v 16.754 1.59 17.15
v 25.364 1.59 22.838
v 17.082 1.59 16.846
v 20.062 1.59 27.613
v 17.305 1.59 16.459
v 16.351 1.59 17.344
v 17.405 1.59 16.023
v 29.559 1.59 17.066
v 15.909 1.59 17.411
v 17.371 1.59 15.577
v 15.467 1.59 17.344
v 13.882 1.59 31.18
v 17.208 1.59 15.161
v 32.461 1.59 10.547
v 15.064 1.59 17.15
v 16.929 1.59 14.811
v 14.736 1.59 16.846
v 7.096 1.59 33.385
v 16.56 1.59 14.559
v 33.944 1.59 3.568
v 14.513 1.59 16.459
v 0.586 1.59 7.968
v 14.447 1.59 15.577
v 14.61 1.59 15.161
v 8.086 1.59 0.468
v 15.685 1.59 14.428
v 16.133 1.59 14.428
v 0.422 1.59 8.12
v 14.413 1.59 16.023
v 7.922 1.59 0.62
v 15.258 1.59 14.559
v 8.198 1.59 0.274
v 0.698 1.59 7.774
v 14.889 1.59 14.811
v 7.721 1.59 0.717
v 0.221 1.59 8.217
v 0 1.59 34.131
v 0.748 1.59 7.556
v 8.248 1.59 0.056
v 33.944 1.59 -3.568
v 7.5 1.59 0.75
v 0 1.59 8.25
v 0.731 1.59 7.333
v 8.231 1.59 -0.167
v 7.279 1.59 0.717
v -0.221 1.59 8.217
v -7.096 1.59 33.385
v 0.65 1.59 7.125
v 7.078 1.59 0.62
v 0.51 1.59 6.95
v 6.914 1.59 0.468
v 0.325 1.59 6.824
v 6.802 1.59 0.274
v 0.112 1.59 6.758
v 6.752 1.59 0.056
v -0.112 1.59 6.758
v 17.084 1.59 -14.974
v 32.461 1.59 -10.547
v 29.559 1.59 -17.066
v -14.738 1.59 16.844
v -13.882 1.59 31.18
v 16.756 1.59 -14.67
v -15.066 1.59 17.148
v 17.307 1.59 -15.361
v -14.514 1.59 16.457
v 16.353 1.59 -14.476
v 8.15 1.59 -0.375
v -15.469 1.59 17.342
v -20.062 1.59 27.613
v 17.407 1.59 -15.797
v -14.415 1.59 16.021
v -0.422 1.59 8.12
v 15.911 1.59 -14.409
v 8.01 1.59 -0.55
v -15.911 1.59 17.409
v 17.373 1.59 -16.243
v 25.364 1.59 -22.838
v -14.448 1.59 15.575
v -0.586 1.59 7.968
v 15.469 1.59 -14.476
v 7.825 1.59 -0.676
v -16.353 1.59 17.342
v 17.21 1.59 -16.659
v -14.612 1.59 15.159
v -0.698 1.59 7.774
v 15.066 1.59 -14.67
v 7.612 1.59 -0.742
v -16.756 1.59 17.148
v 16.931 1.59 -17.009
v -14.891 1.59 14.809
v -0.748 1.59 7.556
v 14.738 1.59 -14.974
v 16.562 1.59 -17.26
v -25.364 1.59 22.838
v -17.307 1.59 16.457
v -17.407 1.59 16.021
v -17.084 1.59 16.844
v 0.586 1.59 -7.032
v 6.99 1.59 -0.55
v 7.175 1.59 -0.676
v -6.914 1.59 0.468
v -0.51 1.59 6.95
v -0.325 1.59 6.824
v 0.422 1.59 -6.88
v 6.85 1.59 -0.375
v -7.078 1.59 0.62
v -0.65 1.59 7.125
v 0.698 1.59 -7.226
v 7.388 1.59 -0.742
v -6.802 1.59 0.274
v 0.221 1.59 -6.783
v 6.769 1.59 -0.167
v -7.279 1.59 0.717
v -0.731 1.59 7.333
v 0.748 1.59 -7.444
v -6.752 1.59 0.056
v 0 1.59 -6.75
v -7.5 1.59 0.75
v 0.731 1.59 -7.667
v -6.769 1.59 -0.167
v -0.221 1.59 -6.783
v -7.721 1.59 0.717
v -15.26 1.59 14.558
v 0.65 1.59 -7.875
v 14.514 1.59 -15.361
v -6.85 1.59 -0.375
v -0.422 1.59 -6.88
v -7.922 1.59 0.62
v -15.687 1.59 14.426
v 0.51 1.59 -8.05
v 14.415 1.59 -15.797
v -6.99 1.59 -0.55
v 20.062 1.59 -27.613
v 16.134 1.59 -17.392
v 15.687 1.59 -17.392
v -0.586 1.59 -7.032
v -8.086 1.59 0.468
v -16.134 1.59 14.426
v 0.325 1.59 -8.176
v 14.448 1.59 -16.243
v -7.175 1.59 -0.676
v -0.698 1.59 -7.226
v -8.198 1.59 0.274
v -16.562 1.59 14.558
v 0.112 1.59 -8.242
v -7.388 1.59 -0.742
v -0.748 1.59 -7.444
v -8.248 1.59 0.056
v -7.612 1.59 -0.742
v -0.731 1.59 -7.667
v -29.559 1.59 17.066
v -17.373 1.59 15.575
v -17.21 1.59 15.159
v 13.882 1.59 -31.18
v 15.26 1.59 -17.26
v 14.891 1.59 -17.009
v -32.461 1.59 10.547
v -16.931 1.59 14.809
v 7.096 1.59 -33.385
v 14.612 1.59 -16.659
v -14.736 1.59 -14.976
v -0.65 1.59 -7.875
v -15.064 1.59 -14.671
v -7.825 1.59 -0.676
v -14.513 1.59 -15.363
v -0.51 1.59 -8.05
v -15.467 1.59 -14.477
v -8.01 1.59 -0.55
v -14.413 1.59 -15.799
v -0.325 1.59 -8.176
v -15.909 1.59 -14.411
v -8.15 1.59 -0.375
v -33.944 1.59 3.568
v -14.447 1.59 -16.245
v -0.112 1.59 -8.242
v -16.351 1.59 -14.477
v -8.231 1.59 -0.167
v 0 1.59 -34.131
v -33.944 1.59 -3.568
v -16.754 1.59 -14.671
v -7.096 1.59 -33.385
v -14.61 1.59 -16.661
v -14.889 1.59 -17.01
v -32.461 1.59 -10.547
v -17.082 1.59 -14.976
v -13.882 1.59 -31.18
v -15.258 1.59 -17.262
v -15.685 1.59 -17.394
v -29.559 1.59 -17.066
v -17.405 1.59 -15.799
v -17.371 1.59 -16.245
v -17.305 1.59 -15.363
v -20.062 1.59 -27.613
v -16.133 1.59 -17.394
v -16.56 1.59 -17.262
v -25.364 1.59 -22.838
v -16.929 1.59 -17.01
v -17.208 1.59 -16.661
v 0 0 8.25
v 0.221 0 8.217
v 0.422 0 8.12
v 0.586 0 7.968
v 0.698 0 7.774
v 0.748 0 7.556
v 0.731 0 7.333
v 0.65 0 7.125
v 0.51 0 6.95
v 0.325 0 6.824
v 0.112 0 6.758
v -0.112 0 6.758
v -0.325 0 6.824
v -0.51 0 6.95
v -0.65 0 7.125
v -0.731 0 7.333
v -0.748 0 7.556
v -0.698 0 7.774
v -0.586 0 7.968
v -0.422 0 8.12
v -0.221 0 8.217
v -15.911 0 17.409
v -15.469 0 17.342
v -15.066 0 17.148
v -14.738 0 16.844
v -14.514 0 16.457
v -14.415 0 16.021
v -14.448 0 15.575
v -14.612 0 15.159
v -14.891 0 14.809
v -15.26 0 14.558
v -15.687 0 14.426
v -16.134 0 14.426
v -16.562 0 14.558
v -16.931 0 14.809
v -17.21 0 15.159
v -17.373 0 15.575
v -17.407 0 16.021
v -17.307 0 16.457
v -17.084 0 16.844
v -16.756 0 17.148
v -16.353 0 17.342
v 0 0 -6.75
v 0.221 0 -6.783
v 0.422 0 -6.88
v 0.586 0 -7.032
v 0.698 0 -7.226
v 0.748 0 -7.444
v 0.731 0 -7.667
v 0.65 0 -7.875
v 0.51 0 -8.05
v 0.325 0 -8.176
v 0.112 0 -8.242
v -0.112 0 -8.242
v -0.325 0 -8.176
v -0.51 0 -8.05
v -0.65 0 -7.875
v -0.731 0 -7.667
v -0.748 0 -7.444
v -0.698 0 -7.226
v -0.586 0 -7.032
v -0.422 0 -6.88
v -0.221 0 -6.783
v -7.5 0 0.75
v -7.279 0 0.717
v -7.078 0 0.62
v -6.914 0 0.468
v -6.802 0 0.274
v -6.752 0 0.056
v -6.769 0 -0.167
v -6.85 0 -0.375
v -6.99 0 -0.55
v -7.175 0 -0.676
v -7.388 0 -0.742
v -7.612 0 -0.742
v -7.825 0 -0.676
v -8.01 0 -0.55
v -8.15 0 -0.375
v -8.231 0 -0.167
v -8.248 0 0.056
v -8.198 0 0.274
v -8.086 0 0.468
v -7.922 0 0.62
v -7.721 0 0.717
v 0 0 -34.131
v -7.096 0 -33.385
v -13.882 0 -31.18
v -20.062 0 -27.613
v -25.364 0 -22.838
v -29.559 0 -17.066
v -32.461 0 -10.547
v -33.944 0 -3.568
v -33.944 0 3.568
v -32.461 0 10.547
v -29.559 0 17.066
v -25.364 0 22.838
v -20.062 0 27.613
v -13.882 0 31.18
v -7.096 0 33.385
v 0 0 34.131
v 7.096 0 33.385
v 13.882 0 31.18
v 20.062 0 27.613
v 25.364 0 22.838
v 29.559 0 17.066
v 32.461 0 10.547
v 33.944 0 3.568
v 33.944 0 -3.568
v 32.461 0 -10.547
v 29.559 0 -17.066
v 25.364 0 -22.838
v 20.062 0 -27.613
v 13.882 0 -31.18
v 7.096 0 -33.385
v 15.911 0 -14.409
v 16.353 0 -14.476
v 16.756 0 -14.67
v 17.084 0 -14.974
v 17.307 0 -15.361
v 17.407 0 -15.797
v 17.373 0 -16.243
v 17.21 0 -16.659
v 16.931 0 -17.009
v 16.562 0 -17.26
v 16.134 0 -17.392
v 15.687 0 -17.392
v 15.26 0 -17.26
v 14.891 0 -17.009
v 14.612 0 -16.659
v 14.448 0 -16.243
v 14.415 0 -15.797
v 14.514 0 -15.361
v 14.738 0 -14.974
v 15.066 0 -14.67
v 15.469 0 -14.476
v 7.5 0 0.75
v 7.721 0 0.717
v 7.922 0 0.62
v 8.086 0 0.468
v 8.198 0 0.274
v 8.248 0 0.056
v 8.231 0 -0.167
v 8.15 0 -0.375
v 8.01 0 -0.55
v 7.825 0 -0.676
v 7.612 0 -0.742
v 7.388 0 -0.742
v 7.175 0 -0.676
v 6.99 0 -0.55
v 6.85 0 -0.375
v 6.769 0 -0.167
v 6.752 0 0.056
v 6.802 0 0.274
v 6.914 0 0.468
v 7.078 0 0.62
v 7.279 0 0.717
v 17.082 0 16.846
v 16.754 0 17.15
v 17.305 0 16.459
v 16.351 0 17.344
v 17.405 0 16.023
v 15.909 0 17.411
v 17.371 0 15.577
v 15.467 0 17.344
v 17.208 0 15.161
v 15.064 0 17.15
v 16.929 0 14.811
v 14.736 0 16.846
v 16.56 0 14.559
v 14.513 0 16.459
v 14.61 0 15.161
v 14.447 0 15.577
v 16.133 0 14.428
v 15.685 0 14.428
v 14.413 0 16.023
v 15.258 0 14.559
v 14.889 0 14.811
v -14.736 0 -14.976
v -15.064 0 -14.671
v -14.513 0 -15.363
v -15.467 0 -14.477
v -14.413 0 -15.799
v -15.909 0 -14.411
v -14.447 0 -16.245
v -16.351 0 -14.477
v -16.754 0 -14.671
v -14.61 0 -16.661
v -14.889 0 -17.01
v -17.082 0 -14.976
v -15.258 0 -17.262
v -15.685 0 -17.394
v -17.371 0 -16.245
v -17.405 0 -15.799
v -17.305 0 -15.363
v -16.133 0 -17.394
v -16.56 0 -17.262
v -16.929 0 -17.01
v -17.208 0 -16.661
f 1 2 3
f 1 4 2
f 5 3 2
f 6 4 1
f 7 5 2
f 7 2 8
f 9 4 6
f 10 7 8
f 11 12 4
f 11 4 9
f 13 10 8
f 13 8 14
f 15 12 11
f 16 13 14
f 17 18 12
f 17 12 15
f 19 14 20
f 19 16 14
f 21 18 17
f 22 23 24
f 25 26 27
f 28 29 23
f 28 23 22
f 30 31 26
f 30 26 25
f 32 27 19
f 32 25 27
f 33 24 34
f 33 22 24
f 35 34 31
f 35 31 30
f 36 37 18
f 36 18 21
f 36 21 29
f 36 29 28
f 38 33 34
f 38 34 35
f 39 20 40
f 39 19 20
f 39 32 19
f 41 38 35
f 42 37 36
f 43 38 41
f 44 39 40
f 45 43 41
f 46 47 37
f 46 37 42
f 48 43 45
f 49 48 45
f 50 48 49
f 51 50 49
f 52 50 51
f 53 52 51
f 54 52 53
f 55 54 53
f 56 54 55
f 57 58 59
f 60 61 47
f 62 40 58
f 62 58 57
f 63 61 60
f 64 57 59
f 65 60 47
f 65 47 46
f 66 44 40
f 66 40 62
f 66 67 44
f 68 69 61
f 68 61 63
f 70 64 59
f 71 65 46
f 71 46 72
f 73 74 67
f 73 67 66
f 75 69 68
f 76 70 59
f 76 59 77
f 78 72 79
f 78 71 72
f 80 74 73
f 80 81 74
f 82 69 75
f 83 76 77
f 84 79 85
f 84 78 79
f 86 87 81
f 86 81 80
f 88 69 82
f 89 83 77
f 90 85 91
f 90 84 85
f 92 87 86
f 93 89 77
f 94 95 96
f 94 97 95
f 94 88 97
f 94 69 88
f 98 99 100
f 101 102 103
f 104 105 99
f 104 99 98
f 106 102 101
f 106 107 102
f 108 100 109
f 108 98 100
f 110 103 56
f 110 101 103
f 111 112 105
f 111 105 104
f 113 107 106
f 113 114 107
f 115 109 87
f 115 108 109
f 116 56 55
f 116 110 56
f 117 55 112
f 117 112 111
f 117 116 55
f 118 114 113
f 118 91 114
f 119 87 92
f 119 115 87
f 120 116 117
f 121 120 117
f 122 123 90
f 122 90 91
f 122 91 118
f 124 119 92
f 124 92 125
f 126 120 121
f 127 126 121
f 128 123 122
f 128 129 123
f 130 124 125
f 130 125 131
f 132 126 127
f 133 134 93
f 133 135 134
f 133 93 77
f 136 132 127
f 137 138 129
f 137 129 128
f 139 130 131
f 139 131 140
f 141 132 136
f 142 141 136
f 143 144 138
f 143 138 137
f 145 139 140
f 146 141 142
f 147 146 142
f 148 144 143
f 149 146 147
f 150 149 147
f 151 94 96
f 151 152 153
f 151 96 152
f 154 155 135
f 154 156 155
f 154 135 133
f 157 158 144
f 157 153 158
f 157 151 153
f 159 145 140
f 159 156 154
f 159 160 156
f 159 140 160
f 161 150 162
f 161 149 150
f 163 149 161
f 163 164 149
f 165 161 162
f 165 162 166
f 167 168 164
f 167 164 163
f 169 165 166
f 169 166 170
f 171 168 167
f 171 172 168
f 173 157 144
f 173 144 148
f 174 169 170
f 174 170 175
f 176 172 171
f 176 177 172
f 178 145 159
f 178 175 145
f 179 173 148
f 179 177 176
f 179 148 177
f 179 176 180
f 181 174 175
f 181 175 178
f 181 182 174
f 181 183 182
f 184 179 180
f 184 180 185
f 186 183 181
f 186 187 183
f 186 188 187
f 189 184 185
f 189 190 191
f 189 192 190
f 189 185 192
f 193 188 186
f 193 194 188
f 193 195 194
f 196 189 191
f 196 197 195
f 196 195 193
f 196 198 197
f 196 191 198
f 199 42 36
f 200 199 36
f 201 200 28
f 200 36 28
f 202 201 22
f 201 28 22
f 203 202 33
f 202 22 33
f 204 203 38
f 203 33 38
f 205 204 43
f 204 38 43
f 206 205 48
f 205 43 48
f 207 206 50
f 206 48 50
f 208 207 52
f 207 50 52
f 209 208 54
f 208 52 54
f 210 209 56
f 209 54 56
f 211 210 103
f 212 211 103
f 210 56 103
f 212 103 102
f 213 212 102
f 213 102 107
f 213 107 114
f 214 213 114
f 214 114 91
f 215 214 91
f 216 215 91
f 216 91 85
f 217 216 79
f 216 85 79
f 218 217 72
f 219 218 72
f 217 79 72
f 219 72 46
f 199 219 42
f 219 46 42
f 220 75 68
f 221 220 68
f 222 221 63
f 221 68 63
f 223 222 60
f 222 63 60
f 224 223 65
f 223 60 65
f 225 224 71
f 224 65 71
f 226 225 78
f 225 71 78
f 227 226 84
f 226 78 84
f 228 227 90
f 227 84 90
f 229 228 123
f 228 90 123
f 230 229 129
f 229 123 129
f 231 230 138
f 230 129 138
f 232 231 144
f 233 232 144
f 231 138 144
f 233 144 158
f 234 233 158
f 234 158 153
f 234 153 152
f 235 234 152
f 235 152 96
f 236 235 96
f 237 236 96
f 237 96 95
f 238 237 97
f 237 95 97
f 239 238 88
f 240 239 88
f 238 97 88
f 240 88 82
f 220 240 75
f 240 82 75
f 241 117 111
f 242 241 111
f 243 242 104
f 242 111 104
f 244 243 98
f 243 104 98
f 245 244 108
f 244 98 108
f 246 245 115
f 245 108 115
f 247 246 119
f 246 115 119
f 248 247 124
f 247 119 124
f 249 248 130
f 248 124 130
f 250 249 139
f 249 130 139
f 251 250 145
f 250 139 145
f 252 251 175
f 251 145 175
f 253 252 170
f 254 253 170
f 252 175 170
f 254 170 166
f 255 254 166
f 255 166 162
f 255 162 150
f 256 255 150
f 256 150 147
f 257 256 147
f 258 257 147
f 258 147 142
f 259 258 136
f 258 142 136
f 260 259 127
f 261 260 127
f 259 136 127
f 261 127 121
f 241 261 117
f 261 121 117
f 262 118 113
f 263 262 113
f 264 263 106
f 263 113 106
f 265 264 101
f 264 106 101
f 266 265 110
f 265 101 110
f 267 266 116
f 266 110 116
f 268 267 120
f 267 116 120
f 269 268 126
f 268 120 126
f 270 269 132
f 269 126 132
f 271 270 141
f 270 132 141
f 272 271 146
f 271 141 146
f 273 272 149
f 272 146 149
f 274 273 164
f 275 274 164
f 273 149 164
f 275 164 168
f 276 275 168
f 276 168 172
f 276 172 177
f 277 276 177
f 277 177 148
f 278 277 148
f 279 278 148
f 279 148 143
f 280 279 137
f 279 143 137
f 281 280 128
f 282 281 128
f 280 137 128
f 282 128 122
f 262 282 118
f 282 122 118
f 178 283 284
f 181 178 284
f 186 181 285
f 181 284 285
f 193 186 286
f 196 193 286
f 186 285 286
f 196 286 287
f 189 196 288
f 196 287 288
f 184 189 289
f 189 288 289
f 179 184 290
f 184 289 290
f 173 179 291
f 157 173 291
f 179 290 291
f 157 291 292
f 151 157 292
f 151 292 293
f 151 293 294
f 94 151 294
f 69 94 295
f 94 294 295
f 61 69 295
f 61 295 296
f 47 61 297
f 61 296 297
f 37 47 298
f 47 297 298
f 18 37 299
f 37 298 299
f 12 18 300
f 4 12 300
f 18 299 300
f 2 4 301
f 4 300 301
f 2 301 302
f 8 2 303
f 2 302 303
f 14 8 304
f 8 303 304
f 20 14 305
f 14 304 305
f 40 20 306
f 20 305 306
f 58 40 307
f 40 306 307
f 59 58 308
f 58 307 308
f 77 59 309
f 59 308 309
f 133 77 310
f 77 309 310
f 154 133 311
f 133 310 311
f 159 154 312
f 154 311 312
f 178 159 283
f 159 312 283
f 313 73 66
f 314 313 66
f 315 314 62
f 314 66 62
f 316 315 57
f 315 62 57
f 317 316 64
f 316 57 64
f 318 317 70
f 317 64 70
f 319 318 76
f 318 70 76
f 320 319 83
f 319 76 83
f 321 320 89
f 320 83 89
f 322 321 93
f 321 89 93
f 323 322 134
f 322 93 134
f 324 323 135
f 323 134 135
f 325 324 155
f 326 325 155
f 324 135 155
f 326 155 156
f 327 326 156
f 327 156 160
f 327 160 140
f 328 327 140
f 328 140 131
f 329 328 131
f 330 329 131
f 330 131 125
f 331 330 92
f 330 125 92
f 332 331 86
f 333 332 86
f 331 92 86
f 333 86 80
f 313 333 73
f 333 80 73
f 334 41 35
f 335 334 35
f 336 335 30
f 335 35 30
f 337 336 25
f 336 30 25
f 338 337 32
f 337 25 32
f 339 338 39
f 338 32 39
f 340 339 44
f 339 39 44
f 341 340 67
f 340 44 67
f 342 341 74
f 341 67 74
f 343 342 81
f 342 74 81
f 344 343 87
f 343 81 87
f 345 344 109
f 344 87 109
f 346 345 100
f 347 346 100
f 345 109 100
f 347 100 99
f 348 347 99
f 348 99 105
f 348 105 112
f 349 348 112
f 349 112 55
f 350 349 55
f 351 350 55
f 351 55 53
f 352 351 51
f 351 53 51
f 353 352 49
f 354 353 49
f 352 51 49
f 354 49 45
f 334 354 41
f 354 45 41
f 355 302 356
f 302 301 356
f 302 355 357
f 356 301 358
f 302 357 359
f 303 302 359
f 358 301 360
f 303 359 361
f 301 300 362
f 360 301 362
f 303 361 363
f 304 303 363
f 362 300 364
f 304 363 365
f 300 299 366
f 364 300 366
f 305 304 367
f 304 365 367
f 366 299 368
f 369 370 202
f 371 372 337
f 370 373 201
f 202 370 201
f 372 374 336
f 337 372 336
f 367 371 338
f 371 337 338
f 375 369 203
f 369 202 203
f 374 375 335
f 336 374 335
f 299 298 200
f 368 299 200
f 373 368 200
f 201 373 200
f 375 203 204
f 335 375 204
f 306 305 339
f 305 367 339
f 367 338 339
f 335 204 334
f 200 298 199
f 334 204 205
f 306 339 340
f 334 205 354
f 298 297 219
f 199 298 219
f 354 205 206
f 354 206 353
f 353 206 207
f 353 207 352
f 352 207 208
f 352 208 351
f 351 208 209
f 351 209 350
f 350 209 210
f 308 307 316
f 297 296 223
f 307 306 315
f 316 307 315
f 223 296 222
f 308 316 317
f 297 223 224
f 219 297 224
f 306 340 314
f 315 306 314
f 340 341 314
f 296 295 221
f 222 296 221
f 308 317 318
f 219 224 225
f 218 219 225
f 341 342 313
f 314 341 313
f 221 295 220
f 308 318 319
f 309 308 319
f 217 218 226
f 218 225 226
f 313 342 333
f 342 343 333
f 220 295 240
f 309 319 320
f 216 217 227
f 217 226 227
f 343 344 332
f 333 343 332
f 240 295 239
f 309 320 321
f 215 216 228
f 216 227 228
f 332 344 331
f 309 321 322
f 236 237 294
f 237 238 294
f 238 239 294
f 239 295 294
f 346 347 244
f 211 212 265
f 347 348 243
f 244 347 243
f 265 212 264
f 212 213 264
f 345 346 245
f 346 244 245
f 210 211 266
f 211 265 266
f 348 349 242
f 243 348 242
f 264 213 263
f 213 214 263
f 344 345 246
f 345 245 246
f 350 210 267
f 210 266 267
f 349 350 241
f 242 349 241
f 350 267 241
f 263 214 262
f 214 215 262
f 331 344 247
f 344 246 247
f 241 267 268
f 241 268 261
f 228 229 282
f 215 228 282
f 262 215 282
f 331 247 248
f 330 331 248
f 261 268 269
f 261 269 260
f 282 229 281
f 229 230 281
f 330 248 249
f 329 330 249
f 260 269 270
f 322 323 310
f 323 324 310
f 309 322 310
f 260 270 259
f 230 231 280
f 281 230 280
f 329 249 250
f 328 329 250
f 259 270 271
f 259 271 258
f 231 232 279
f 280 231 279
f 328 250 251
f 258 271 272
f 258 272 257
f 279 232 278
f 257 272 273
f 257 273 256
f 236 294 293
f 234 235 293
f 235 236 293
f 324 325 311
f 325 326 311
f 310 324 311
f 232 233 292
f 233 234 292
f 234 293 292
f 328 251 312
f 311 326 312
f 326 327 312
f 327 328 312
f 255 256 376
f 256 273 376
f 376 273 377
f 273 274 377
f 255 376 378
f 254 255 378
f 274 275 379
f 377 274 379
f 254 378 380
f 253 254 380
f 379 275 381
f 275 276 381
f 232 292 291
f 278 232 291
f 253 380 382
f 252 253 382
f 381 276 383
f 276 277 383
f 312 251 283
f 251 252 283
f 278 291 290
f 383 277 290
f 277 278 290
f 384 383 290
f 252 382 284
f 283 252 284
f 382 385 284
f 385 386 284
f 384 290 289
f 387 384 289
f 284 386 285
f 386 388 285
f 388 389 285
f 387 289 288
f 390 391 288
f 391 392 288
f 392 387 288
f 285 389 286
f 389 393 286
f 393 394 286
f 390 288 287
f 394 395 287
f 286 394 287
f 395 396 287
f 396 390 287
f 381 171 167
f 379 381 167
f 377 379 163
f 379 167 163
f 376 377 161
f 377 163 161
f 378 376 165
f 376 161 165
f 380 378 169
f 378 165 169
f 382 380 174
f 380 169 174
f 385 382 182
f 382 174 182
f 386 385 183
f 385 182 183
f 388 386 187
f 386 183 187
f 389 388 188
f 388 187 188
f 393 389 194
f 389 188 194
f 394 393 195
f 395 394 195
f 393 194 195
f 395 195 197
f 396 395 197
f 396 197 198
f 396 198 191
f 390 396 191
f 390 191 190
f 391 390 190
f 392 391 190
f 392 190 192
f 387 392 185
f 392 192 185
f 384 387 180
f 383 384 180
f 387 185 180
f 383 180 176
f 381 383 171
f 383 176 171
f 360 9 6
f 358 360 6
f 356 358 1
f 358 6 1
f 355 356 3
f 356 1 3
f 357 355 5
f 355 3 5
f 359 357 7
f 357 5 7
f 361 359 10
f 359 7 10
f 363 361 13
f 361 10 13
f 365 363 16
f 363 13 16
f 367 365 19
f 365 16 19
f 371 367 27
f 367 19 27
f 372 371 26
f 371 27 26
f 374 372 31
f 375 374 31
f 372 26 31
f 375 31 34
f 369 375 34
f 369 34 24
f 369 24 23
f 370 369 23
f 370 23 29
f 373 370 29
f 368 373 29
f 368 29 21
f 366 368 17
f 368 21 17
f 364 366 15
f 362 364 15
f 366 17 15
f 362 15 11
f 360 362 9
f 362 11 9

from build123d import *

# Parameters (mm, degrees)
SKETCH1_R           = 34.13125
BOSS_EXTRUDE1_DEPTH = 1.59
SKETCH2_R           = 0.75
CUT_EXTRUDE1_DEPTH  = 1.59
SKETCH3_R           = 1.5
CUT_EXTRUDE2_DEPTH  = 1.59


with BuildPart() as part:
    # Sketch1 → Boss-Extrude1 (new body)
    with BuildSketch(Plane(origin=(0, 0, 0), x_dir=(1, 0, 0), z_dir=(0, 1, 0))):
        with Locations(Location((0, 0, 0), (0, 0, 90))):
            Circle(SKETCH1_R)
    extrude(amount=BOSS_EXTRUDE1_DEPTH)

    # Sketch2 → Cut-Extrude1 (cut)
    with BuildSketch(Plane(origin=(0, 1.59, 0), x_dir=(1, 0, 0), z_dir=(0, 1, 0))):
        with Locations(Location((0, -7.5, 0), (0, 0, 270))):
            Circle(SKETCH2_R)
        with Locations(Location((0, 7.5, 0), (0, 0, 270))):
            Circle(SKETCH2_R)
        with Locations(Location((-7.5, 0, 0), (0, 0, 270))):
            Circle(SKETCH2_R)
        with Locations(Location((7.5, 0, 0), (0, 0, 270))):
            Circle(SKETCH2_R)
    extrude(amount=-CUT_EXTRUDE1_DEPTH, mode=Mode.SUBTRACT)

    # Sketch3 → Cut-Extrude2 (cut)
    with BuildSketch(Plane(origin=(0, 1.59, 0), x_dir=(1, 0, 0), z_dir=(0, 1, 0))):
        with Locations(Location((-15.909, 15.910805102, 0), (0, 0, 270))):
            Circle(SKETCH3_R)
        with Locations(Location((15.910805102, 15.909, 0), (0, 0, 270))):
            Circle(SKETCH3_R)
        with Locations(Location((15.909, -15.910805102, 0), (0, 0, 270))):
            Circle(SKETCH3_R)
        with Locations(Location((-15.910805102, -15.909, 0), (0, 0, 270))):
            Circle(SKETCH3_R)
    extrude(amount=-CUT_EXTRUDE2_DEPTH, mode=Mode.SUBTRACT)


solid = part.part
